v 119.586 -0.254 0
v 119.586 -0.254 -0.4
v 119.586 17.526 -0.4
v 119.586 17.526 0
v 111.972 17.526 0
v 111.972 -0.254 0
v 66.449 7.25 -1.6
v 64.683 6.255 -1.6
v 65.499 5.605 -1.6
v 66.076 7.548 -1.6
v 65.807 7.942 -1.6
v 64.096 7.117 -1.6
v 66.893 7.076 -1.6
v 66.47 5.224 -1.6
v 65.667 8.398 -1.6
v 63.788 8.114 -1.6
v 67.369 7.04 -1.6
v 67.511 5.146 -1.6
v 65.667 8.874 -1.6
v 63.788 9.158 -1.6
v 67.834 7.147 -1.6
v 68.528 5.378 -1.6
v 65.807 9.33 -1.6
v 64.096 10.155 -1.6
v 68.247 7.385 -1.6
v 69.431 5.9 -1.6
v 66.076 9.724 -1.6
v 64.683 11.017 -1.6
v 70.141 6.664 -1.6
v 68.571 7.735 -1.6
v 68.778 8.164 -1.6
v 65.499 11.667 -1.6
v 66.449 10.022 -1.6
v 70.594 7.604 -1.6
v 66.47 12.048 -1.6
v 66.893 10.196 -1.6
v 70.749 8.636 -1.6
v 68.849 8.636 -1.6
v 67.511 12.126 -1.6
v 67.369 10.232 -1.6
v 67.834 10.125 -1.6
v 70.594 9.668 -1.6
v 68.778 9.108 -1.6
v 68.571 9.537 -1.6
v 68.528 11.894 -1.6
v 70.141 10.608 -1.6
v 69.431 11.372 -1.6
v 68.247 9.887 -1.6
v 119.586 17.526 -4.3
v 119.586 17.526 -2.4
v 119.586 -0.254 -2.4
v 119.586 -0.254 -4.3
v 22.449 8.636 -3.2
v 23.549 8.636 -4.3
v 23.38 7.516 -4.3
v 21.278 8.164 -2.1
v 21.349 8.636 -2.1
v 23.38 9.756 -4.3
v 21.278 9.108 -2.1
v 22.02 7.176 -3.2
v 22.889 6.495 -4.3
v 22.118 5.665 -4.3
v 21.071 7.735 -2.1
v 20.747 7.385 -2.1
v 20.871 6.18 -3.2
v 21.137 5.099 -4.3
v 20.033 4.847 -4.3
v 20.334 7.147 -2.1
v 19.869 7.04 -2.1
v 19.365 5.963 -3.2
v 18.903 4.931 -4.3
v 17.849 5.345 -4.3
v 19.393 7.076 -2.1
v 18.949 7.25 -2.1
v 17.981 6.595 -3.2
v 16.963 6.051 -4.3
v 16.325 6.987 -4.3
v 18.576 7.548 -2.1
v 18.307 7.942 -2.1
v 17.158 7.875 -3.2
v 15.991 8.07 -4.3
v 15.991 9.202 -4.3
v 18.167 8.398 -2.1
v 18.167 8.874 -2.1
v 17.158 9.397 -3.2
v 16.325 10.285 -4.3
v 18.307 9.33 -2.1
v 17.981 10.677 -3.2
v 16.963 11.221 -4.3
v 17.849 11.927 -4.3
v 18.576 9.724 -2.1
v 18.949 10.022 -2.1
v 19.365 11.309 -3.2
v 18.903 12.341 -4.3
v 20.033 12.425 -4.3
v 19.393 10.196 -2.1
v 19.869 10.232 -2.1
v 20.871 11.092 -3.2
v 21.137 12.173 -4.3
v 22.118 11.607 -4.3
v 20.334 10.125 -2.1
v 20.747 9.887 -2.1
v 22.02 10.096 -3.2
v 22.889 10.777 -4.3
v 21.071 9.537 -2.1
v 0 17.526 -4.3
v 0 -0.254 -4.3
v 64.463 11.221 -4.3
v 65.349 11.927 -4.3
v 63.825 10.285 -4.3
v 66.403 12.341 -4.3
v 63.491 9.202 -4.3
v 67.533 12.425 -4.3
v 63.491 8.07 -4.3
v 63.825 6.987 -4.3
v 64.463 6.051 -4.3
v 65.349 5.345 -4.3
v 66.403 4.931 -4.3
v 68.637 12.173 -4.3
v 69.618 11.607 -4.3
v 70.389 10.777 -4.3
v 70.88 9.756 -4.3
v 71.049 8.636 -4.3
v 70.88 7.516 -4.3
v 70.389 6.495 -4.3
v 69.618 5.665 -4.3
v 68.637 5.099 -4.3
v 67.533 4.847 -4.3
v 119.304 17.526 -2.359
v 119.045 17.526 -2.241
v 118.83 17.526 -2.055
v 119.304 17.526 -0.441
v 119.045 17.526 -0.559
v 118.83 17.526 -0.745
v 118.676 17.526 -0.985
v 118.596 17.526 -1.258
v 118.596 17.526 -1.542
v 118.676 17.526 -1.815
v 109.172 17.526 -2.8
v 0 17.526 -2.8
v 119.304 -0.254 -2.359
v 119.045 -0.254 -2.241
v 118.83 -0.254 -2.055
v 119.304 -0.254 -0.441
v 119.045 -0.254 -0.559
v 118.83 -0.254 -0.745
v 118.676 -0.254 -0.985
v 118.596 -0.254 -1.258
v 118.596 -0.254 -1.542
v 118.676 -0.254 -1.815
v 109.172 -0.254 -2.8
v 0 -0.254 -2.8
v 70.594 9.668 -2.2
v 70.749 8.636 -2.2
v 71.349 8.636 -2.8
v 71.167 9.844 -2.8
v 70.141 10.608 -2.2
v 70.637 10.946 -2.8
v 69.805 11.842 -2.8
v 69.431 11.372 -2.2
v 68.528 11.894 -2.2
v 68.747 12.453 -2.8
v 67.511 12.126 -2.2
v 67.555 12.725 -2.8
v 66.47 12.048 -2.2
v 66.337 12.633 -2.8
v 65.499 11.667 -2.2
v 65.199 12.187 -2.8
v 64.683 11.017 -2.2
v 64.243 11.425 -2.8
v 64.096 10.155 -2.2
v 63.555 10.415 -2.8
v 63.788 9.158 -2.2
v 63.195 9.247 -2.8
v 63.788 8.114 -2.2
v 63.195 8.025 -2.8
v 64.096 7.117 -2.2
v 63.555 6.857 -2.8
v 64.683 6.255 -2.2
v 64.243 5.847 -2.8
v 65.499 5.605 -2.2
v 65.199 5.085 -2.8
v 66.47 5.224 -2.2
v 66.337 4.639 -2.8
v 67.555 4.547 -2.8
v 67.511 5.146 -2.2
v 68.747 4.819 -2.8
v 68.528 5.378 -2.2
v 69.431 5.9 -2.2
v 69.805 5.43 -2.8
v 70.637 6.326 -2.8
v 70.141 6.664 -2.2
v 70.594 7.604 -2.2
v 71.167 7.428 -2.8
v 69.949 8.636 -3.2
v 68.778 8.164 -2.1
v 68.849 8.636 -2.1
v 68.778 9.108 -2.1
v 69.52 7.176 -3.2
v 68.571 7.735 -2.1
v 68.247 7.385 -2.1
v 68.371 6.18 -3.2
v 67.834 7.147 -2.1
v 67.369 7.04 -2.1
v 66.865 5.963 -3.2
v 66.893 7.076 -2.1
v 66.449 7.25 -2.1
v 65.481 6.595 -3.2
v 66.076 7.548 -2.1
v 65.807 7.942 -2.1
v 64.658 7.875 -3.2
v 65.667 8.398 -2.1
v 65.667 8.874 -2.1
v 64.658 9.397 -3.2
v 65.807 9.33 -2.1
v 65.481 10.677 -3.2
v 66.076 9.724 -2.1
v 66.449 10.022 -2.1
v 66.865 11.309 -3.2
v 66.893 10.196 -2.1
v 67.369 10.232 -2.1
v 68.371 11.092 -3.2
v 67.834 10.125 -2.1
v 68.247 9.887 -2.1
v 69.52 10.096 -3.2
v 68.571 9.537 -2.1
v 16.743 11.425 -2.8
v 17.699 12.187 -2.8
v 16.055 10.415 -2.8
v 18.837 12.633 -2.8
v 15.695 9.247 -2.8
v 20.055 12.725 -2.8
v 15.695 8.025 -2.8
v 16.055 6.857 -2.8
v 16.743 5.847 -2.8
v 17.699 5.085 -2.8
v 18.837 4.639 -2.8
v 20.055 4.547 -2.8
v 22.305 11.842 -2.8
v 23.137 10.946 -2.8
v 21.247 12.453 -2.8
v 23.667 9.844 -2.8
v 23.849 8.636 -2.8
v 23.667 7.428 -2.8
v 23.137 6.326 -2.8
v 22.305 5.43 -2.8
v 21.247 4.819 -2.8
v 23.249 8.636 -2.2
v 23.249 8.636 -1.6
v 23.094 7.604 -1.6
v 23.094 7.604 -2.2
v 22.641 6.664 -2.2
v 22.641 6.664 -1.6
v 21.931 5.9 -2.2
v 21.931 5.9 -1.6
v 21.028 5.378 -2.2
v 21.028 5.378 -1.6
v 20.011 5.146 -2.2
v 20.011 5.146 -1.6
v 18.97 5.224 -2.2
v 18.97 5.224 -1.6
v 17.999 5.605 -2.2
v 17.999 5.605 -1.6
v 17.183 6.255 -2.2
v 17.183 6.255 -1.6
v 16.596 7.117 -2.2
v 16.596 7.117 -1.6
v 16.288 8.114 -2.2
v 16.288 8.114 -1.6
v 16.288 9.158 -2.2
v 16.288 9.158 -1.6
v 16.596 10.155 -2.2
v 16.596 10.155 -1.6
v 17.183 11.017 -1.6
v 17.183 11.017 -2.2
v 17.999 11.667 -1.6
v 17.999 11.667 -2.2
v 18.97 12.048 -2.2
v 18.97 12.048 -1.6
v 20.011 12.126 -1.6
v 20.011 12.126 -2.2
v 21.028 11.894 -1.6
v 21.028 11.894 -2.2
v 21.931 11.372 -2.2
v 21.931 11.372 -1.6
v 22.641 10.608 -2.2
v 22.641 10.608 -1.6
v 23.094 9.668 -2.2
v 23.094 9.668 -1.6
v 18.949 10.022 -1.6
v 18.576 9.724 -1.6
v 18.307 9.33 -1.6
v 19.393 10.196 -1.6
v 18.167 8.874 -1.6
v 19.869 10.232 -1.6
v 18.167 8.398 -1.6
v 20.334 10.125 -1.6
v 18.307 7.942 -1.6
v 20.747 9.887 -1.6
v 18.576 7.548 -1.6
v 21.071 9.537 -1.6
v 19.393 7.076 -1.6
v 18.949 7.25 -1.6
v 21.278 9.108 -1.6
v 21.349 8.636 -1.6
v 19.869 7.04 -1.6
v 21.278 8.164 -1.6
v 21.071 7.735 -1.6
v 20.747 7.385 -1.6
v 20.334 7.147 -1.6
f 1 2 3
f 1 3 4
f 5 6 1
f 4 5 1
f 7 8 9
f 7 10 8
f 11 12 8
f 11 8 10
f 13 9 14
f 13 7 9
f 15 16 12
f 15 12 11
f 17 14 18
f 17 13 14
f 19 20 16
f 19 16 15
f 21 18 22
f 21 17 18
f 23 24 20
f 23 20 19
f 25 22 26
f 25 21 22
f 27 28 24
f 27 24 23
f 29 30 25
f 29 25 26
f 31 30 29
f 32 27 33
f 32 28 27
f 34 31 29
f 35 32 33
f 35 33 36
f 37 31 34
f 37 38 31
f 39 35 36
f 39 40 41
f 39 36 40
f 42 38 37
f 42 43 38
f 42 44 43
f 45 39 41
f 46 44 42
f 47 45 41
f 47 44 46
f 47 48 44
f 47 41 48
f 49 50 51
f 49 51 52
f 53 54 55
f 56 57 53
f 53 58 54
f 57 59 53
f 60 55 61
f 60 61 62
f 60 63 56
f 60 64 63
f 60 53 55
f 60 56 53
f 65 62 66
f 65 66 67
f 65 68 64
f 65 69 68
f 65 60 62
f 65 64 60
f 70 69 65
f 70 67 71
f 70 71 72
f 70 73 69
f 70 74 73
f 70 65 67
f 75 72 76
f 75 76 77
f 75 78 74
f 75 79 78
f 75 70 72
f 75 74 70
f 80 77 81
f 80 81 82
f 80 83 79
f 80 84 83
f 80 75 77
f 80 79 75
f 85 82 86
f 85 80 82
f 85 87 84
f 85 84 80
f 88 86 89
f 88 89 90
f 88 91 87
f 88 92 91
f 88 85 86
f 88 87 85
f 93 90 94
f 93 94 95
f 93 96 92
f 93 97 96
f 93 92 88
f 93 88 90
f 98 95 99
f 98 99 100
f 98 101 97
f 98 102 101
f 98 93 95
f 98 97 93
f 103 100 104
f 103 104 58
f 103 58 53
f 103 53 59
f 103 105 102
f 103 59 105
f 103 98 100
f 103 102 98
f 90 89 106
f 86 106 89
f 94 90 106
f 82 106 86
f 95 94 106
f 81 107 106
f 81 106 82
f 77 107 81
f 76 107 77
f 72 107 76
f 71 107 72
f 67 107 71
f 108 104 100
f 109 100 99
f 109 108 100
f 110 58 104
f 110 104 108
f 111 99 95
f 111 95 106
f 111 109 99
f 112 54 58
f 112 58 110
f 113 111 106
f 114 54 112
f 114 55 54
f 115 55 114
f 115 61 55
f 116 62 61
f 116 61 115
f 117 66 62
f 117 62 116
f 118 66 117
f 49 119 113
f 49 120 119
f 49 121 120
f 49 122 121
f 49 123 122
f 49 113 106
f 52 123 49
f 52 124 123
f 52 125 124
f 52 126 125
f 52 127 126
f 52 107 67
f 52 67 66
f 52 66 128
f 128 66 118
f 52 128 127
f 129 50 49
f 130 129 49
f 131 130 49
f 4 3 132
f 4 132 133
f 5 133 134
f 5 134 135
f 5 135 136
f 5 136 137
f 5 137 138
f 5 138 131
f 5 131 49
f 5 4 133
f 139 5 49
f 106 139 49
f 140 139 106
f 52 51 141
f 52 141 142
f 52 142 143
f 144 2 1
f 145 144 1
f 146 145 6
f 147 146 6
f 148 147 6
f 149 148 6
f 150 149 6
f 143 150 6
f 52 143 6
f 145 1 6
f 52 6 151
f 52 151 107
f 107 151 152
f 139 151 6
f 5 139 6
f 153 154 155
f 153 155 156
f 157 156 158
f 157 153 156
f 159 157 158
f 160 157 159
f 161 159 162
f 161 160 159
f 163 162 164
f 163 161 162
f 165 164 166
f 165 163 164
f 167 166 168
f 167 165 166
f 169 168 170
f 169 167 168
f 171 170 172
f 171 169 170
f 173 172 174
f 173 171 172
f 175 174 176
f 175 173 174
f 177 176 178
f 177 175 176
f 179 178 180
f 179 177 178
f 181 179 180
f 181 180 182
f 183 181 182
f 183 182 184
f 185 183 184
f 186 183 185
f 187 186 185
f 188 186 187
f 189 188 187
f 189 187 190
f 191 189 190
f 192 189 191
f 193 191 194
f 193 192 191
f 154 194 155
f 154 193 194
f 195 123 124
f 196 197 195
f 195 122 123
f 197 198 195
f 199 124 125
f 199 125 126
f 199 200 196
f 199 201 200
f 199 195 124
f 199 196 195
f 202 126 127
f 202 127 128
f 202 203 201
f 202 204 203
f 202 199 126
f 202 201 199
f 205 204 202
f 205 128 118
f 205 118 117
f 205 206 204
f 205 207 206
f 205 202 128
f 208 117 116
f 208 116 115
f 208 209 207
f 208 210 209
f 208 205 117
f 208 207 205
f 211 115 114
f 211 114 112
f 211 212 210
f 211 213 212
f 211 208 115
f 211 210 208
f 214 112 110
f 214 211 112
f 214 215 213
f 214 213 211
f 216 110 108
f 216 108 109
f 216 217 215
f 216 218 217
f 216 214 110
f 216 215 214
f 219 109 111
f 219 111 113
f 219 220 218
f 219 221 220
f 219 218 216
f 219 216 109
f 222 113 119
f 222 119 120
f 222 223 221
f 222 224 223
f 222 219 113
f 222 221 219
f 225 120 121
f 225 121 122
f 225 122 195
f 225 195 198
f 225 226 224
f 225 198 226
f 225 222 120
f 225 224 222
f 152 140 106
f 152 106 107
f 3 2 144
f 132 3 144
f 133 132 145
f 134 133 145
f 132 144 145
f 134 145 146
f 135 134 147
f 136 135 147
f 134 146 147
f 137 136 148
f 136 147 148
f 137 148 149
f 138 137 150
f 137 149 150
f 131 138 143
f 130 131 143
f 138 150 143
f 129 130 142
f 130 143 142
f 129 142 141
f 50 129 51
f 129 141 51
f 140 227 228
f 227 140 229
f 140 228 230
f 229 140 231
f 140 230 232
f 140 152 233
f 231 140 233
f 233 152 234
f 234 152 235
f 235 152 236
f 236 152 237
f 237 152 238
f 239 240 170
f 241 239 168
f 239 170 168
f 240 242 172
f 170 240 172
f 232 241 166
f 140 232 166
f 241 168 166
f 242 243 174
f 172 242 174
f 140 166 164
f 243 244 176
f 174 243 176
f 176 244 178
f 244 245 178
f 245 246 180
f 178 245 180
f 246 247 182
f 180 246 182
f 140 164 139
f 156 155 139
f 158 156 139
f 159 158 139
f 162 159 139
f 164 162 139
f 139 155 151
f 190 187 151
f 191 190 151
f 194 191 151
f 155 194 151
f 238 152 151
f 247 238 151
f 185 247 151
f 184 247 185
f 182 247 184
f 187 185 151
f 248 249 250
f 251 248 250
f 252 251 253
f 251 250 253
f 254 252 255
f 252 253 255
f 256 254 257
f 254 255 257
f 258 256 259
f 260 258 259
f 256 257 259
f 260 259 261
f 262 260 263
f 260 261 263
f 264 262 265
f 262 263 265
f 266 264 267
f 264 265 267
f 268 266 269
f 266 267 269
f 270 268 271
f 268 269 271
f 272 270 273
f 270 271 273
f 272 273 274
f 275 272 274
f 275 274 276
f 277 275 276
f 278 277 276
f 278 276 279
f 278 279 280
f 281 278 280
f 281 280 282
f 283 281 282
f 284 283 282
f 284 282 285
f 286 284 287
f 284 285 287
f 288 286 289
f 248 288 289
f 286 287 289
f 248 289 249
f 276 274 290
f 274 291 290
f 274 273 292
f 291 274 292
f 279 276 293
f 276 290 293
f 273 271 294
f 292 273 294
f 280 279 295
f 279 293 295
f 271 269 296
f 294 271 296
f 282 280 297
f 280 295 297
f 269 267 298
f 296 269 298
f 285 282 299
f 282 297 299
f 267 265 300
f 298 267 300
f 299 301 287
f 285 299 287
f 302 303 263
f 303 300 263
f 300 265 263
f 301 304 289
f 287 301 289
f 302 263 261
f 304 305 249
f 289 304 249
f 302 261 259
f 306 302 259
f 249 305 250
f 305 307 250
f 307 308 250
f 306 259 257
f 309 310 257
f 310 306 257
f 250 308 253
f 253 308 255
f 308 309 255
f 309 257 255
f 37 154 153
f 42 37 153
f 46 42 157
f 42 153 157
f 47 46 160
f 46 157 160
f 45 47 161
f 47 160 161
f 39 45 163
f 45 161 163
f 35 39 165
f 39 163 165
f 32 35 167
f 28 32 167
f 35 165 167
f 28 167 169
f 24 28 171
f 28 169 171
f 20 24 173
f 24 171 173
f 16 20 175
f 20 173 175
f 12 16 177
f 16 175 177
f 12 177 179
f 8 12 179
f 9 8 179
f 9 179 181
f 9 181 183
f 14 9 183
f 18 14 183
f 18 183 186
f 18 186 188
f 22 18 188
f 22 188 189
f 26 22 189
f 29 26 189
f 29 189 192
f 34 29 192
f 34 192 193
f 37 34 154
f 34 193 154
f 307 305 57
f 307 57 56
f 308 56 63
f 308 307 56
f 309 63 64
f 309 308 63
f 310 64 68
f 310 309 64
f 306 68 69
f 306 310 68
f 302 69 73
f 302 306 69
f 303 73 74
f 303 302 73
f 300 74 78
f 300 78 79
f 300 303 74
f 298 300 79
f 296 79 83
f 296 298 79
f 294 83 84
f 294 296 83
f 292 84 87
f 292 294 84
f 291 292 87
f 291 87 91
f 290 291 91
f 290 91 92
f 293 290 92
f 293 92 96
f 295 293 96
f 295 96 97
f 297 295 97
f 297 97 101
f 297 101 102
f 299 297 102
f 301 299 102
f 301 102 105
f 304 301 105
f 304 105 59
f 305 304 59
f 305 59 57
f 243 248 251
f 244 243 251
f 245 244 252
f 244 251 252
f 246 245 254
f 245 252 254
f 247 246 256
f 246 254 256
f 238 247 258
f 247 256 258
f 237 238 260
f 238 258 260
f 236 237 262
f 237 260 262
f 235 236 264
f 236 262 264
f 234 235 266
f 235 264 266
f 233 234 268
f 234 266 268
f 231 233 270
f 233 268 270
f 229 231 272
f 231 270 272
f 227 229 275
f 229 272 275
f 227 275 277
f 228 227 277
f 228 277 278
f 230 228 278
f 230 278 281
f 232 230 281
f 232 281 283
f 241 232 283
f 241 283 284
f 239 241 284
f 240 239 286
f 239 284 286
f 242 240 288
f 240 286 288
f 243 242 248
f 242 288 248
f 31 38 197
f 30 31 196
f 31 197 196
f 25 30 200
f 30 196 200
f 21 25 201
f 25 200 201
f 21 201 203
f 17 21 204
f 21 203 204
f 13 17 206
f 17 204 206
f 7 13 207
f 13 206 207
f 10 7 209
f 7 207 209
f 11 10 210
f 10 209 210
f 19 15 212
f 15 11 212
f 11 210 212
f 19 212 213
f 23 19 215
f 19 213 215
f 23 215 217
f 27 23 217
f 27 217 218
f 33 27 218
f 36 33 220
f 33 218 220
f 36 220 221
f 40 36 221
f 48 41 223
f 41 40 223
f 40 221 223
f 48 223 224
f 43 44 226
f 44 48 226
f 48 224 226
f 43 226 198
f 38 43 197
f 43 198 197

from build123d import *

# Parameters (mm, degrees)
SKETCH_R        = 3.5
SKETCH_R_2      = 1.6
PAD_DEPTH       = 1.2
SKETCH001_W     = 119.586
SKETCH001_H     = 17.78
SKETCH001_R     = 1.6
PAD001_DEPTH    = 1.5
SKETCH002_R     = 3.5
SKETCH002_R_2   = 1.6
PAD002_DEPTH    = 1.2
SKETCH003_R     = 1.6
POCKET_DEPTH    = 2.701
PAD003_DEPTH    = 17.78
CHAMFER_SIZE    = 2.2
CHAMFER002_SIZE = 0.6


with BuildPart() as part:
    # Sketch (on Face1 of CopyPcb_f5c5) → Pad (new body)
    with BuildSketch(Plane(origin=(-93.484762, 101.426, -1.6), x_dir=(1, 0, 0), z_dir=(0, 0, -1))):
        with Locations((113.233762, 92.79)):
            Circle(SKETCH_R)
        with Locations((113.233762, 92.79)):
            Circle(SKETCH_R_2, mode=Mode.SUBTRACT)
    extrude(amount=PAD_DEPTH)

    # Sketch001 (on Face4 of Pad) → Pad001 (join)
    with BuildSketch(Plane(origin=(-93.484762, 101.426, -2.8), x_dir=(1, 0, 0), z_dir=(0, 0, -1))):
        with Locations((153.277762, 92.79)):
            Rectangle(SKETCH001_W, SKETCH001_H)
        with Locations((113.233762, 92.79)):
            Circle(SKETCH001_R, mode=Mode.SUBTRACT)
    extrude(amount=PAD001_DEPTH)

    # Sketch002 (on Face3 of Pad001) → Pad002 (join)
    with BuildSketch(Plane(origin=(-93.484762, 101.426, -2.8), x_dir=(1, 0, 0), z_dir=(0, 0, 1))):
        with Locations((160.733762, -92.79)):
            Circle(SKETCH002_R)
        with Locations((160.733762, -92.79)):
            Circle(SKETCH002_R_2, mode=Mode.SUBTRACT)
    extrude(amount=PAD002_DEPTH)

    # Sketch003 (on Face11 of Pad002) → Pocket (cut, through all)
    with BuildSketch(Plane(origin=(-93.484762, 101.426, -4.3), x_dir=(1, 0, 0), z_dir=(0, 0, -1))):
        with Locations((160.733762, 92.79)):
            Circle(SKETCH003_R)
    extrude(amount=-POCKET_DEPTH, mode=Mode.SUBTRACT)

    # Sketch004 (on Face6 of Pocket) → Pad003 (join)
    with BuildSketch(Plane(origin=(-93.484762, -0.254, -1.6), x_dir=(1, 0, 0), z_dir=(0, -1, 0))):
        with BuildLine():
            Line((202.656762, -1.2), (205.456762, 1.6))
            Line((205.456762, 1.6), (213.070762, 1.6))
            Line((213.070762, 1.2), (213.070762, 1.6))
            ThreePointArc((213.070762, 1.2), (212.070762, 0.2), (213.070762, -0.8))
            Line((213.070762, -0.8), (213.070762, -1.2))
            Line((213.070762, -1.2), (202.656762, -1.2))
        make_face()
    extrude(amount=-PAD003_DEPTH)

    # Chamfer
    chamfer_edges = [part.edges().sort_by_distance(p)[0] for p in [
        (18.149, 8.636, -4.3),
        (65.649, 8.636, -4.3),
    ]]
    chamfer(chamfer_edges, length=CHAMFER_SIZE)

    # Chamfer002
    chamfer002_edges = [part.edges().sort_by_distance(p)[0] for p in [
        (16.249, 8.636, -2.8),
        (63.749, 8.636, -2.8),
    ]]
    chamfer(chamfer002_edges, length=CHAMFER002_SIZE)


solid = part.part
